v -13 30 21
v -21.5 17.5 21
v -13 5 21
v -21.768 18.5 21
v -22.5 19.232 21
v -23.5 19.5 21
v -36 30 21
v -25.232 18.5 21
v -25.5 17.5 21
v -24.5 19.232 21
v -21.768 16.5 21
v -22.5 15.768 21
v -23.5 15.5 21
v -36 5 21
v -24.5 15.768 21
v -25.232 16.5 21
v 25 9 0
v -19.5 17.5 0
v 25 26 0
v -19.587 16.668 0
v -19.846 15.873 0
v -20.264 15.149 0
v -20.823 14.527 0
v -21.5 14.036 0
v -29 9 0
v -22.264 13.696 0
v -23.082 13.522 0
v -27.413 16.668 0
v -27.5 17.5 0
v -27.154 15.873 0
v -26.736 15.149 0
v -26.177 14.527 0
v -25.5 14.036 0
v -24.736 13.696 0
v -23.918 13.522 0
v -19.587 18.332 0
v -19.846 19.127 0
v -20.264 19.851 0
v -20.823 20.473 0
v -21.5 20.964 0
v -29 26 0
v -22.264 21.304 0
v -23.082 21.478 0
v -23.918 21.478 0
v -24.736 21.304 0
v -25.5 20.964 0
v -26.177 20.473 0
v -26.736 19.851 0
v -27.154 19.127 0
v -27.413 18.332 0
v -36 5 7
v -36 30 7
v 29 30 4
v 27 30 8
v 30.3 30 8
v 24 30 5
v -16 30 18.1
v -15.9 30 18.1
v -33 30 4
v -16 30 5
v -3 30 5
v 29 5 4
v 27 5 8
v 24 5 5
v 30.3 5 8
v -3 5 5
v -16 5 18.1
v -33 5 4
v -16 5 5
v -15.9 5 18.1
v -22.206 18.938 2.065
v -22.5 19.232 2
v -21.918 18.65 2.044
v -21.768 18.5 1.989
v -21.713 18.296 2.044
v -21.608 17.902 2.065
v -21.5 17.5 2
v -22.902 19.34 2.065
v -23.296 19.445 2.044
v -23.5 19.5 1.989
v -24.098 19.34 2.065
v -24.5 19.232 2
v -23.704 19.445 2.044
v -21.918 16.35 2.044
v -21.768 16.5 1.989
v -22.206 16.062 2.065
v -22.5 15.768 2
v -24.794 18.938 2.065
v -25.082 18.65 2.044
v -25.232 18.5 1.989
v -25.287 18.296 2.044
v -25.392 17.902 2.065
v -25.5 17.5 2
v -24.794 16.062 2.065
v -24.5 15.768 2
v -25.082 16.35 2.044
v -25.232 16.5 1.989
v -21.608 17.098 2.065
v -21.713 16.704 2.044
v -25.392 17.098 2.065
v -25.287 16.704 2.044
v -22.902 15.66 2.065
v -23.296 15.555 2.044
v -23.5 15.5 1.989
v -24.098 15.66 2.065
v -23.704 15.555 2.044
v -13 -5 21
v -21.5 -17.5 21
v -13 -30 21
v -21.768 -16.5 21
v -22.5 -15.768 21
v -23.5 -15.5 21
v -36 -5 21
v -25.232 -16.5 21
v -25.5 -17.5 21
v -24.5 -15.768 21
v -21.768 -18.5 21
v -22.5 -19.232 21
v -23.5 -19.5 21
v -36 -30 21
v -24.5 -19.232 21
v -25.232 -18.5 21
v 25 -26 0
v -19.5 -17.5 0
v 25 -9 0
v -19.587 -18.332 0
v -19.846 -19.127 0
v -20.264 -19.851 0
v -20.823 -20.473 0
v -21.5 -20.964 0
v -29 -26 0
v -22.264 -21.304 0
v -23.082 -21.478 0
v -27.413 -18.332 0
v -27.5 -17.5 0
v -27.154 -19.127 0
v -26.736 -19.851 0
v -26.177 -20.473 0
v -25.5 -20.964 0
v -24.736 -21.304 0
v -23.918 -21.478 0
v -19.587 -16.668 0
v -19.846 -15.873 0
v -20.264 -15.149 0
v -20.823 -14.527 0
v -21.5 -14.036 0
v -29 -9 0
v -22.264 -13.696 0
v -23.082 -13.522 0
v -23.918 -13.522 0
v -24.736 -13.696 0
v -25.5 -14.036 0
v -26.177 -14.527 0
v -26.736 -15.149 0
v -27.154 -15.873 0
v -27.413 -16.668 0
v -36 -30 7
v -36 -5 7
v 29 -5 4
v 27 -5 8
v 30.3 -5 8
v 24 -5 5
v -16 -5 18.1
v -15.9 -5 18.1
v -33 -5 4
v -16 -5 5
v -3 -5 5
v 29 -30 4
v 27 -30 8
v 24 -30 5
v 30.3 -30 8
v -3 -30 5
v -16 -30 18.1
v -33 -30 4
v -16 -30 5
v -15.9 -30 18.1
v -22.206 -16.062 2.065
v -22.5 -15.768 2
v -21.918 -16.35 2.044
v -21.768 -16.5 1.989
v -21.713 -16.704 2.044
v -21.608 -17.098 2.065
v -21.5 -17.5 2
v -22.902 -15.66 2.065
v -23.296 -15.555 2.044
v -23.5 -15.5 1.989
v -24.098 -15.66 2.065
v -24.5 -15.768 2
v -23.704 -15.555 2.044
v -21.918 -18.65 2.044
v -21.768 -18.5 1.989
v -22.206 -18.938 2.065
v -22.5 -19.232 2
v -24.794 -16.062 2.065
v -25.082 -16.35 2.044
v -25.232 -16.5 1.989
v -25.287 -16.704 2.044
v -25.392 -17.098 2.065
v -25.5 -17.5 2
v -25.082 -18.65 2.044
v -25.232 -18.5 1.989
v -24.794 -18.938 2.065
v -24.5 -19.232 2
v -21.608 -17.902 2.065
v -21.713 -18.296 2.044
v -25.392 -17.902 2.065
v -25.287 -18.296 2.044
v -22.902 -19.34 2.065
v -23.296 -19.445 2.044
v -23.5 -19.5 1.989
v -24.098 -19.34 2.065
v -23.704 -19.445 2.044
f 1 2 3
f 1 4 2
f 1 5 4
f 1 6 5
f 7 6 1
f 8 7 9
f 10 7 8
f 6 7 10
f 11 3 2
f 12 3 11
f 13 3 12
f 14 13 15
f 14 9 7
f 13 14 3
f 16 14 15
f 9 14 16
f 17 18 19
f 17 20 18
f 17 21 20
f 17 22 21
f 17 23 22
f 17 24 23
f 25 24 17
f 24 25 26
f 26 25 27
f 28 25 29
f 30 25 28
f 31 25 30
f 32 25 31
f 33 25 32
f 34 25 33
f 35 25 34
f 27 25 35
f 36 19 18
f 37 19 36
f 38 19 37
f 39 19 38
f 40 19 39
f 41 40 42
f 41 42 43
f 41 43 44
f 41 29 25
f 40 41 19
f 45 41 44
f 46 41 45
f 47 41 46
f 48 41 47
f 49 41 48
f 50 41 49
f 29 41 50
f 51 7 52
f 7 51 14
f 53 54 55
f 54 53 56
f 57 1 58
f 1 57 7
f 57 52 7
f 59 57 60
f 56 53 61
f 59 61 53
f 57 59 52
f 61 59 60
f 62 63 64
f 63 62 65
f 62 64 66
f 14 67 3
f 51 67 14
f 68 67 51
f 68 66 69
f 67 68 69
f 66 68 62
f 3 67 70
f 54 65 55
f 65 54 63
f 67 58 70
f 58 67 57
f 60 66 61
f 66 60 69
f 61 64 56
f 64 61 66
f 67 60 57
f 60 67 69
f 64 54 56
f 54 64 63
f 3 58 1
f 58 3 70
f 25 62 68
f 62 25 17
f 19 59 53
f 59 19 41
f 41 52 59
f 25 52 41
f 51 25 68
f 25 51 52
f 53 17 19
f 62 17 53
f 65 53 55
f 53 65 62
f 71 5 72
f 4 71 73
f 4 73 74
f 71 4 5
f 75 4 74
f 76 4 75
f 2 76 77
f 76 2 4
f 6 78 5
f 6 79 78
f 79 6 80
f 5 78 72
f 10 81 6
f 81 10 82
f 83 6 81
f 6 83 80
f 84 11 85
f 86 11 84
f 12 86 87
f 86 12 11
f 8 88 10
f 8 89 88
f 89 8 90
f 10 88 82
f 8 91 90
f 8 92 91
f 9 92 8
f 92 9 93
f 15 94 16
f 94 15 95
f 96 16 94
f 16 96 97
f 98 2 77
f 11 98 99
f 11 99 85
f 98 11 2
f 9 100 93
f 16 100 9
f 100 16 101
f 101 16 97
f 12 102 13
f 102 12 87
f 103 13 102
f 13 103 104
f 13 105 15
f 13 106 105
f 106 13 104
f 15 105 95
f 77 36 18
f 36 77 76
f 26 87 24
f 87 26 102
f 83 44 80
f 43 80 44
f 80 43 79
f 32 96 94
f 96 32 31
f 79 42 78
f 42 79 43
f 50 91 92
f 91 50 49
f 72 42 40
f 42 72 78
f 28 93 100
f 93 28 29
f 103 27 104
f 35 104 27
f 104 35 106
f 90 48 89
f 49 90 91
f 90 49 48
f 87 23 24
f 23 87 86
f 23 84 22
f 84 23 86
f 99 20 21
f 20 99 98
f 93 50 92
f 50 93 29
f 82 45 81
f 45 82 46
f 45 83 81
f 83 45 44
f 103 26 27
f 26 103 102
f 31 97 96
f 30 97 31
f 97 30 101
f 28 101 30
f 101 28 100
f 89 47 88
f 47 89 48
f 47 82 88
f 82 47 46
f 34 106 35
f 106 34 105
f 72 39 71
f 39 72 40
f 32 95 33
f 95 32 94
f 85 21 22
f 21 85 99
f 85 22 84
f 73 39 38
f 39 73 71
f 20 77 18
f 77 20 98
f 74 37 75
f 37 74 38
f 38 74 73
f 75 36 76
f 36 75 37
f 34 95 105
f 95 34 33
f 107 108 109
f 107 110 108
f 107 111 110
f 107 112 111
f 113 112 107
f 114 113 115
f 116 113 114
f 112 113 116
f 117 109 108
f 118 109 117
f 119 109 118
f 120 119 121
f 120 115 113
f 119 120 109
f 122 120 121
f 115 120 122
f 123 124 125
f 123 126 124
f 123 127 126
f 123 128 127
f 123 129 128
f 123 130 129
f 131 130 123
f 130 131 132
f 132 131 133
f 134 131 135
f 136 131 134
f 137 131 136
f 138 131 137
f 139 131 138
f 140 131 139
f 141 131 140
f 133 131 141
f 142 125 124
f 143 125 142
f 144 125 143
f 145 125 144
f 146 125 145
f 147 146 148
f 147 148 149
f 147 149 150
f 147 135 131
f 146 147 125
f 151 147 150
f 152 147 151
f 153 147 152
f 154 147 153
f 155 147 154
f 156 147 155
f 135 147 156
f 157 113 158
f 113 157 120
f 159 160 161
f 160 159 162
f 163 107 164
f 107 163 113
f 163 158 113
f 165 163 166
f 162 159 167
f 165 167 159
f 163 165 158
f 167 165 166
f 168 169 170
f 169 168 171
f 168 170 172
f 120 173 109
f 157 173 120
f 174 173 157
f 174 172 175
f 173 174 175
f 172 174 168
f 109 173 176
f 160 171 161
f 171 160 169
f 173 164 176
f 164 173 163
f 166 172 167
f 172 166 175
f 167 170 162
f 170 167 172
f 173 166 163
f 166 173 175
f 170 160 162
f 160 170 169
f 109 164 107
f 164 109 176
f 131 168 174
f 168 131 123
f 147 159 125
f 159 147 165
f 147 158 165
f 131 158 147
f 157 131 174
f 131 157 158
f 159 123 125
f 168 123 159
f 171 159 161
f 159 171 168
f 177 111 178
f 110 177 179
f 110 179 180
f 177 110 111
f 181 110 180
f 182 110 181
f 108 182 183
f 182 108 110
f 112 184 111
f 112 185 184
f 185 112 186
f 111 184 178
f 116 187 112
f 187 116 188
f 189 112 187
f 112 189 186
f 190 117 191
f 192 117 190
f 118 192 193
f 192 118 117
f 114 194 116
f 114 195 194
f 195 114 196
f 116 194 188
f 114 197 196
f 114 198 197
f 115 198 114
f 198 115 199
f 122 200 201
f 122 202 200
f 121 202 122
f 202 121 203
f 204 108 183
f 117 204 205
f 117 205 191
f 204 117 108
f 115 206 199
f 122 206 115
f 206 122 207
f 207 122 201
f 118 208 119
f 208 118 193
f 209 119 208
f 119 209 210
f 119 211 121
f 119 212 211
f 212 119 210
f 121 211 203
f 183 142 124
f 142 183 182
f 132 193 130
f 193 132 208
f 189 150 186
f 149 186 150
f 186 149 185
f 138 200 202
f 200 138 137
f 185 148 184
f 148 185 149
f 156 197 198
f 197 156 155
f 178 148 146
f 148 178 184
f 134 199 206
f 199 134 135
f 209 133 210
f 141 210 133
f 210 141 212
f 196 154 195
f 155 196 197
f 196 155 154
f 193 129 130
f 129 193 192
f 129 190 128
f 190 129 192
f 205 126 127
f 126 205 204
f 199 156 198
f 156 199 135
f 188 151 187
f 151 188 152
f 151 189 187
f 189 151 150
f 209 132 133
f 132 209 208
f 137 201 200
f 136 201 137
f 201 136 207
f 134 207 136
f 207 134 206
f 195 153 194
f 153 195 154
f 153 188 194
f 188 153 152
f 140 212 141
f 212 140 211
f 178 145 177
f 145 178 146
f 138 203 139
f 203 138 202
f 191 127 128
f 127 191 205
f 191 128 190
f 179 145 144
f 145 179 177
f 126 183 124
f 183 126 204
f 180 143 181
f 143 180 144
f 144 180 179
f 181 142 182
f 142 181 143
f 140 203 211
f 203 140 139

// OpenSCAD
// file: ../ShapeLibrary/Chamfer.scad
// External chamfer along X-axis from given point which lies
// on the edge to be chamfered off, marked with "+":
//
//   +-.---
//   |/
//   .
//   |
//
// Point p is at one end, and the other end is at p+[l,0,0],
// (so the sign of l controls the direction to the other end).
//
// w is the size of the chamfer (distance from "+" to "." above).
//
// q=0 -> chamfer to +y,+z
// q=1 -> chamfer to -y,+z
// q=2 -> chamfer to -y,-z
// q=3 -> chamfer to +y,-z
// (Non-integral values of Q can tweak the chamfer angle,
// but the value of w is not preserved.)
//
// The chamfer is defined as a shape that is to be subtracted from
// the original to which the chamfer is applied.
//
module chamferX(p, l, w, q, d)
{
  xl = abs(l);
  xo = min(l,0);
  translate(p)
    rotate([45+q*90,0,0])
      translate([xo-d,0,-w])
        cube(size=[xl+2*d,w/sqrt(2),w*2]);
}

// External chamfer aligned with Y-axis
//
// q=0 -> chamfer to +x,+z
// q=1 -> chamfer to -x,+z
// q=2 -> chamfer to -x,-z
// q=3 -> chamfer to +x,-z
//
module chamferY(p, l, w, q, d)
{
  yl = abs(l);
  yo = min(l,0);
  translate(p)
    rotate([0,-45-q*90,0])
      translate([0,yo-d,-w])
        cube(size=[w/sqrt(2),yl+2*d,w*2]);
}

// External chamfer aligned with Z-axis
//
// q=0 -> chamfer to +x,+y
// q=1 -> chamfer to -x,+y
// q=2 -> chamfer to -y,-y
// q=3 -> chamfer to +y,-y
//
module chamferZ(p, l, w, q, d)
{
  zl = abs(l);
  zo = min(l,0);
  translate(p)
    rotate([0,0,45+q*90])
      translate([0,-w,zo-d])
        cube(size=[w/sqrt(2),w*2,zl+2*d]);
}

// X-axis internal chamfer located on/ending at a given edge;
// marked "+" or "*" here:
//
//   .-*---
//   |/
//   +
//   |
//
// Point p is at one end, and the other end is at p+[l,0,0],
// (so the sign of l controls the direction to the other end).
//
// w is the size of the chamfer (distance from "+" to "." above).
//
// q=0 -> chamfer to +z
// q=1 -> chamfer to -y
// q=2 -> chamfer to -z
// q=3 -> chamfer to +y
//
// Unlike the external chamfer, this defined shape is added to a shape to
// make the chamfer
//
module chamferXint(p, l, w, q, d)
{
  xl = abs(l);
  xo = min(l,0);
  translate(p)
    rotate([+45+q*90,0,0])
      translate([xo-d,0,0])
        cube(size=[xl+2*d,w*sqrt(2),w*sqrt(2)]);
}

// Y-axis internal chamfer located on/ending at a given edge
//
// q=0 -> chamfer to +z
// q=1 -> chamfer to -x
// q=2 -> chamfer to -z
// q=3 -> chamfer to +x
module chamferYint(p, l, w, q, d)
{
  yl = abs(l);
  yo = min(l,0);
  translate(p)
    rotate([0,-45-q*90,0])
      translate([0,yo-d,0])
        cube(size=[w*sqrt(2),yl+2*d,w*sqrt(2)]);
}


// Z-axis internal chamfer located on/ending at a given edge
//
// q=0 -> chamfer to +x
// q=1 -> chamfer to -y
// q=2 -> chamfer to -x
// q=3 -> chamfer to +y
module chamferZint(p, l, w, q, d)
{
  zl = abs(l);
  zo = min(l,0);
  translate(p)
    rotate([0,0,-45-q*90])
      translate([0,0,zo-d])
        cube(size=[w*sqrt(2),w*sqrt(2),zl+2*d]);
}

// Examples

union()
{
    difference()
    {
        cube([25,25,25]);
        translate([10,10,10]) cube([25,25,25]);
        chamferX([0,0,0],20,5,0,0.1);
        chamferY([0,0,0],20,5,0,0.1);
        chamferZ([0,0,0],20,5,0,0.1);
    }
   chamferXint([10,15,10],12,5,1,0.1);	// q=1 : -y
   chamferYint([15,10,10],12,5,1,0.1);  // q=1 : -x
   //chamferZint([15,10,10],25,5,2,0.1);  // q=2 : -x
   chamferZint([10,15,10],12,5,1,0.1);  // q=1 : -y
}
// main file
// Bracket for storing boat rear deck cover support

// ------------------------
// Shape crafting primitves
// ------------------------

use <../ShapeLibrary/Chamfer.scad>

// -----------
// The bracket
// -----------


// ho = hb + he - he + hi


// lo = length overall
// wo = width overall
// ho = height overall
// li = length of internal space
// hi = height of internal space
// he = height of end lip
// le = end lip length
// hd = screw hole diameter
// d  = delta for CSG
//
module bracket(lo, wo, ho, li, hi, le, he, hd, d)
{
  // ho = hb + he - he + hi
  hb = ho-hi;
  io = lo-li-le-le-2;        // Offset to inner corner inside support  
  co = ho - hi - he - 1 ;  // Chamfer offset around base (except -x)
  difference()
  {
    cube(size=[lo, wo, ho]);
      translate([lo-li-le,-d,ho-hi]) cube([lo,wo+2*d,hi+d]);       // gap
      translate([io,-d,ho-hi-he]) cube([li,wo+2*d,hi+d]); // int
      chamferYint([io+li,0,ho-hi-he], wo, hi, 0, d);  // Int chamfer at end
      chamferYint([io,0,ho-he], wo, hi, 3, d);  // Int chamfer at base
      chamferX([0,0,0], lo, co, 0, d);
      chamferX([0,wo,0], lo, co, 1, d);
      chamferY([0,0,0], lo, co+he, 0, d);
      chamferY([lo,0,0], wo, hb+he, 1, d);
      chamferYint([lo-(hb+he)+co,0,co], wo, co+hi, 3.3, d);
      translate([wo/2,wo/2,-d]) cylinder(r=hd/2, h=ho+d*2, $fa=30, $fs=0.25);
      translate([wo/2,wo/2,-d]) cylinder(r1=hd+d, r2=0, h=hd+d, $fs=0.25);
  }
  // translate([0,0,-ho-0]) cube(size=[lo, wo, ho]);
}

// -----------------
// Top level objects
// -----------------

//translate([10,20,0]) sphere(r=2, $fn=12);

//chamferZ([10,20,0], -30, 5, 1, 0.5);

//chamferYint([10,20,0], -30, 5, 3, 0.5);

lenoverall  = 72;
leninternal = 40;
widoverall  = 25;
hgtoverall  = 6+15;
hgtinternal = hgtoverall-8; // 6+7;
lenend      = 5;
hgtend      = 0+3;
holedia     = 4;

translate([-lenoverall/2, 5, 0])
  bracket(lenoverall, widoverall, hgtoverall, 
          leninternal, hgtinternal, 
          lenend, hgtend, 
          holedia, 0.1);

translate([-lenoverall/2, -widoverall-5, 0])
  bracket(lenoverall, widoverall, hgtoverall, 
          leninternal, hgtinternal, 
          lenend, hgtend, 
          holedia, 0.1);
